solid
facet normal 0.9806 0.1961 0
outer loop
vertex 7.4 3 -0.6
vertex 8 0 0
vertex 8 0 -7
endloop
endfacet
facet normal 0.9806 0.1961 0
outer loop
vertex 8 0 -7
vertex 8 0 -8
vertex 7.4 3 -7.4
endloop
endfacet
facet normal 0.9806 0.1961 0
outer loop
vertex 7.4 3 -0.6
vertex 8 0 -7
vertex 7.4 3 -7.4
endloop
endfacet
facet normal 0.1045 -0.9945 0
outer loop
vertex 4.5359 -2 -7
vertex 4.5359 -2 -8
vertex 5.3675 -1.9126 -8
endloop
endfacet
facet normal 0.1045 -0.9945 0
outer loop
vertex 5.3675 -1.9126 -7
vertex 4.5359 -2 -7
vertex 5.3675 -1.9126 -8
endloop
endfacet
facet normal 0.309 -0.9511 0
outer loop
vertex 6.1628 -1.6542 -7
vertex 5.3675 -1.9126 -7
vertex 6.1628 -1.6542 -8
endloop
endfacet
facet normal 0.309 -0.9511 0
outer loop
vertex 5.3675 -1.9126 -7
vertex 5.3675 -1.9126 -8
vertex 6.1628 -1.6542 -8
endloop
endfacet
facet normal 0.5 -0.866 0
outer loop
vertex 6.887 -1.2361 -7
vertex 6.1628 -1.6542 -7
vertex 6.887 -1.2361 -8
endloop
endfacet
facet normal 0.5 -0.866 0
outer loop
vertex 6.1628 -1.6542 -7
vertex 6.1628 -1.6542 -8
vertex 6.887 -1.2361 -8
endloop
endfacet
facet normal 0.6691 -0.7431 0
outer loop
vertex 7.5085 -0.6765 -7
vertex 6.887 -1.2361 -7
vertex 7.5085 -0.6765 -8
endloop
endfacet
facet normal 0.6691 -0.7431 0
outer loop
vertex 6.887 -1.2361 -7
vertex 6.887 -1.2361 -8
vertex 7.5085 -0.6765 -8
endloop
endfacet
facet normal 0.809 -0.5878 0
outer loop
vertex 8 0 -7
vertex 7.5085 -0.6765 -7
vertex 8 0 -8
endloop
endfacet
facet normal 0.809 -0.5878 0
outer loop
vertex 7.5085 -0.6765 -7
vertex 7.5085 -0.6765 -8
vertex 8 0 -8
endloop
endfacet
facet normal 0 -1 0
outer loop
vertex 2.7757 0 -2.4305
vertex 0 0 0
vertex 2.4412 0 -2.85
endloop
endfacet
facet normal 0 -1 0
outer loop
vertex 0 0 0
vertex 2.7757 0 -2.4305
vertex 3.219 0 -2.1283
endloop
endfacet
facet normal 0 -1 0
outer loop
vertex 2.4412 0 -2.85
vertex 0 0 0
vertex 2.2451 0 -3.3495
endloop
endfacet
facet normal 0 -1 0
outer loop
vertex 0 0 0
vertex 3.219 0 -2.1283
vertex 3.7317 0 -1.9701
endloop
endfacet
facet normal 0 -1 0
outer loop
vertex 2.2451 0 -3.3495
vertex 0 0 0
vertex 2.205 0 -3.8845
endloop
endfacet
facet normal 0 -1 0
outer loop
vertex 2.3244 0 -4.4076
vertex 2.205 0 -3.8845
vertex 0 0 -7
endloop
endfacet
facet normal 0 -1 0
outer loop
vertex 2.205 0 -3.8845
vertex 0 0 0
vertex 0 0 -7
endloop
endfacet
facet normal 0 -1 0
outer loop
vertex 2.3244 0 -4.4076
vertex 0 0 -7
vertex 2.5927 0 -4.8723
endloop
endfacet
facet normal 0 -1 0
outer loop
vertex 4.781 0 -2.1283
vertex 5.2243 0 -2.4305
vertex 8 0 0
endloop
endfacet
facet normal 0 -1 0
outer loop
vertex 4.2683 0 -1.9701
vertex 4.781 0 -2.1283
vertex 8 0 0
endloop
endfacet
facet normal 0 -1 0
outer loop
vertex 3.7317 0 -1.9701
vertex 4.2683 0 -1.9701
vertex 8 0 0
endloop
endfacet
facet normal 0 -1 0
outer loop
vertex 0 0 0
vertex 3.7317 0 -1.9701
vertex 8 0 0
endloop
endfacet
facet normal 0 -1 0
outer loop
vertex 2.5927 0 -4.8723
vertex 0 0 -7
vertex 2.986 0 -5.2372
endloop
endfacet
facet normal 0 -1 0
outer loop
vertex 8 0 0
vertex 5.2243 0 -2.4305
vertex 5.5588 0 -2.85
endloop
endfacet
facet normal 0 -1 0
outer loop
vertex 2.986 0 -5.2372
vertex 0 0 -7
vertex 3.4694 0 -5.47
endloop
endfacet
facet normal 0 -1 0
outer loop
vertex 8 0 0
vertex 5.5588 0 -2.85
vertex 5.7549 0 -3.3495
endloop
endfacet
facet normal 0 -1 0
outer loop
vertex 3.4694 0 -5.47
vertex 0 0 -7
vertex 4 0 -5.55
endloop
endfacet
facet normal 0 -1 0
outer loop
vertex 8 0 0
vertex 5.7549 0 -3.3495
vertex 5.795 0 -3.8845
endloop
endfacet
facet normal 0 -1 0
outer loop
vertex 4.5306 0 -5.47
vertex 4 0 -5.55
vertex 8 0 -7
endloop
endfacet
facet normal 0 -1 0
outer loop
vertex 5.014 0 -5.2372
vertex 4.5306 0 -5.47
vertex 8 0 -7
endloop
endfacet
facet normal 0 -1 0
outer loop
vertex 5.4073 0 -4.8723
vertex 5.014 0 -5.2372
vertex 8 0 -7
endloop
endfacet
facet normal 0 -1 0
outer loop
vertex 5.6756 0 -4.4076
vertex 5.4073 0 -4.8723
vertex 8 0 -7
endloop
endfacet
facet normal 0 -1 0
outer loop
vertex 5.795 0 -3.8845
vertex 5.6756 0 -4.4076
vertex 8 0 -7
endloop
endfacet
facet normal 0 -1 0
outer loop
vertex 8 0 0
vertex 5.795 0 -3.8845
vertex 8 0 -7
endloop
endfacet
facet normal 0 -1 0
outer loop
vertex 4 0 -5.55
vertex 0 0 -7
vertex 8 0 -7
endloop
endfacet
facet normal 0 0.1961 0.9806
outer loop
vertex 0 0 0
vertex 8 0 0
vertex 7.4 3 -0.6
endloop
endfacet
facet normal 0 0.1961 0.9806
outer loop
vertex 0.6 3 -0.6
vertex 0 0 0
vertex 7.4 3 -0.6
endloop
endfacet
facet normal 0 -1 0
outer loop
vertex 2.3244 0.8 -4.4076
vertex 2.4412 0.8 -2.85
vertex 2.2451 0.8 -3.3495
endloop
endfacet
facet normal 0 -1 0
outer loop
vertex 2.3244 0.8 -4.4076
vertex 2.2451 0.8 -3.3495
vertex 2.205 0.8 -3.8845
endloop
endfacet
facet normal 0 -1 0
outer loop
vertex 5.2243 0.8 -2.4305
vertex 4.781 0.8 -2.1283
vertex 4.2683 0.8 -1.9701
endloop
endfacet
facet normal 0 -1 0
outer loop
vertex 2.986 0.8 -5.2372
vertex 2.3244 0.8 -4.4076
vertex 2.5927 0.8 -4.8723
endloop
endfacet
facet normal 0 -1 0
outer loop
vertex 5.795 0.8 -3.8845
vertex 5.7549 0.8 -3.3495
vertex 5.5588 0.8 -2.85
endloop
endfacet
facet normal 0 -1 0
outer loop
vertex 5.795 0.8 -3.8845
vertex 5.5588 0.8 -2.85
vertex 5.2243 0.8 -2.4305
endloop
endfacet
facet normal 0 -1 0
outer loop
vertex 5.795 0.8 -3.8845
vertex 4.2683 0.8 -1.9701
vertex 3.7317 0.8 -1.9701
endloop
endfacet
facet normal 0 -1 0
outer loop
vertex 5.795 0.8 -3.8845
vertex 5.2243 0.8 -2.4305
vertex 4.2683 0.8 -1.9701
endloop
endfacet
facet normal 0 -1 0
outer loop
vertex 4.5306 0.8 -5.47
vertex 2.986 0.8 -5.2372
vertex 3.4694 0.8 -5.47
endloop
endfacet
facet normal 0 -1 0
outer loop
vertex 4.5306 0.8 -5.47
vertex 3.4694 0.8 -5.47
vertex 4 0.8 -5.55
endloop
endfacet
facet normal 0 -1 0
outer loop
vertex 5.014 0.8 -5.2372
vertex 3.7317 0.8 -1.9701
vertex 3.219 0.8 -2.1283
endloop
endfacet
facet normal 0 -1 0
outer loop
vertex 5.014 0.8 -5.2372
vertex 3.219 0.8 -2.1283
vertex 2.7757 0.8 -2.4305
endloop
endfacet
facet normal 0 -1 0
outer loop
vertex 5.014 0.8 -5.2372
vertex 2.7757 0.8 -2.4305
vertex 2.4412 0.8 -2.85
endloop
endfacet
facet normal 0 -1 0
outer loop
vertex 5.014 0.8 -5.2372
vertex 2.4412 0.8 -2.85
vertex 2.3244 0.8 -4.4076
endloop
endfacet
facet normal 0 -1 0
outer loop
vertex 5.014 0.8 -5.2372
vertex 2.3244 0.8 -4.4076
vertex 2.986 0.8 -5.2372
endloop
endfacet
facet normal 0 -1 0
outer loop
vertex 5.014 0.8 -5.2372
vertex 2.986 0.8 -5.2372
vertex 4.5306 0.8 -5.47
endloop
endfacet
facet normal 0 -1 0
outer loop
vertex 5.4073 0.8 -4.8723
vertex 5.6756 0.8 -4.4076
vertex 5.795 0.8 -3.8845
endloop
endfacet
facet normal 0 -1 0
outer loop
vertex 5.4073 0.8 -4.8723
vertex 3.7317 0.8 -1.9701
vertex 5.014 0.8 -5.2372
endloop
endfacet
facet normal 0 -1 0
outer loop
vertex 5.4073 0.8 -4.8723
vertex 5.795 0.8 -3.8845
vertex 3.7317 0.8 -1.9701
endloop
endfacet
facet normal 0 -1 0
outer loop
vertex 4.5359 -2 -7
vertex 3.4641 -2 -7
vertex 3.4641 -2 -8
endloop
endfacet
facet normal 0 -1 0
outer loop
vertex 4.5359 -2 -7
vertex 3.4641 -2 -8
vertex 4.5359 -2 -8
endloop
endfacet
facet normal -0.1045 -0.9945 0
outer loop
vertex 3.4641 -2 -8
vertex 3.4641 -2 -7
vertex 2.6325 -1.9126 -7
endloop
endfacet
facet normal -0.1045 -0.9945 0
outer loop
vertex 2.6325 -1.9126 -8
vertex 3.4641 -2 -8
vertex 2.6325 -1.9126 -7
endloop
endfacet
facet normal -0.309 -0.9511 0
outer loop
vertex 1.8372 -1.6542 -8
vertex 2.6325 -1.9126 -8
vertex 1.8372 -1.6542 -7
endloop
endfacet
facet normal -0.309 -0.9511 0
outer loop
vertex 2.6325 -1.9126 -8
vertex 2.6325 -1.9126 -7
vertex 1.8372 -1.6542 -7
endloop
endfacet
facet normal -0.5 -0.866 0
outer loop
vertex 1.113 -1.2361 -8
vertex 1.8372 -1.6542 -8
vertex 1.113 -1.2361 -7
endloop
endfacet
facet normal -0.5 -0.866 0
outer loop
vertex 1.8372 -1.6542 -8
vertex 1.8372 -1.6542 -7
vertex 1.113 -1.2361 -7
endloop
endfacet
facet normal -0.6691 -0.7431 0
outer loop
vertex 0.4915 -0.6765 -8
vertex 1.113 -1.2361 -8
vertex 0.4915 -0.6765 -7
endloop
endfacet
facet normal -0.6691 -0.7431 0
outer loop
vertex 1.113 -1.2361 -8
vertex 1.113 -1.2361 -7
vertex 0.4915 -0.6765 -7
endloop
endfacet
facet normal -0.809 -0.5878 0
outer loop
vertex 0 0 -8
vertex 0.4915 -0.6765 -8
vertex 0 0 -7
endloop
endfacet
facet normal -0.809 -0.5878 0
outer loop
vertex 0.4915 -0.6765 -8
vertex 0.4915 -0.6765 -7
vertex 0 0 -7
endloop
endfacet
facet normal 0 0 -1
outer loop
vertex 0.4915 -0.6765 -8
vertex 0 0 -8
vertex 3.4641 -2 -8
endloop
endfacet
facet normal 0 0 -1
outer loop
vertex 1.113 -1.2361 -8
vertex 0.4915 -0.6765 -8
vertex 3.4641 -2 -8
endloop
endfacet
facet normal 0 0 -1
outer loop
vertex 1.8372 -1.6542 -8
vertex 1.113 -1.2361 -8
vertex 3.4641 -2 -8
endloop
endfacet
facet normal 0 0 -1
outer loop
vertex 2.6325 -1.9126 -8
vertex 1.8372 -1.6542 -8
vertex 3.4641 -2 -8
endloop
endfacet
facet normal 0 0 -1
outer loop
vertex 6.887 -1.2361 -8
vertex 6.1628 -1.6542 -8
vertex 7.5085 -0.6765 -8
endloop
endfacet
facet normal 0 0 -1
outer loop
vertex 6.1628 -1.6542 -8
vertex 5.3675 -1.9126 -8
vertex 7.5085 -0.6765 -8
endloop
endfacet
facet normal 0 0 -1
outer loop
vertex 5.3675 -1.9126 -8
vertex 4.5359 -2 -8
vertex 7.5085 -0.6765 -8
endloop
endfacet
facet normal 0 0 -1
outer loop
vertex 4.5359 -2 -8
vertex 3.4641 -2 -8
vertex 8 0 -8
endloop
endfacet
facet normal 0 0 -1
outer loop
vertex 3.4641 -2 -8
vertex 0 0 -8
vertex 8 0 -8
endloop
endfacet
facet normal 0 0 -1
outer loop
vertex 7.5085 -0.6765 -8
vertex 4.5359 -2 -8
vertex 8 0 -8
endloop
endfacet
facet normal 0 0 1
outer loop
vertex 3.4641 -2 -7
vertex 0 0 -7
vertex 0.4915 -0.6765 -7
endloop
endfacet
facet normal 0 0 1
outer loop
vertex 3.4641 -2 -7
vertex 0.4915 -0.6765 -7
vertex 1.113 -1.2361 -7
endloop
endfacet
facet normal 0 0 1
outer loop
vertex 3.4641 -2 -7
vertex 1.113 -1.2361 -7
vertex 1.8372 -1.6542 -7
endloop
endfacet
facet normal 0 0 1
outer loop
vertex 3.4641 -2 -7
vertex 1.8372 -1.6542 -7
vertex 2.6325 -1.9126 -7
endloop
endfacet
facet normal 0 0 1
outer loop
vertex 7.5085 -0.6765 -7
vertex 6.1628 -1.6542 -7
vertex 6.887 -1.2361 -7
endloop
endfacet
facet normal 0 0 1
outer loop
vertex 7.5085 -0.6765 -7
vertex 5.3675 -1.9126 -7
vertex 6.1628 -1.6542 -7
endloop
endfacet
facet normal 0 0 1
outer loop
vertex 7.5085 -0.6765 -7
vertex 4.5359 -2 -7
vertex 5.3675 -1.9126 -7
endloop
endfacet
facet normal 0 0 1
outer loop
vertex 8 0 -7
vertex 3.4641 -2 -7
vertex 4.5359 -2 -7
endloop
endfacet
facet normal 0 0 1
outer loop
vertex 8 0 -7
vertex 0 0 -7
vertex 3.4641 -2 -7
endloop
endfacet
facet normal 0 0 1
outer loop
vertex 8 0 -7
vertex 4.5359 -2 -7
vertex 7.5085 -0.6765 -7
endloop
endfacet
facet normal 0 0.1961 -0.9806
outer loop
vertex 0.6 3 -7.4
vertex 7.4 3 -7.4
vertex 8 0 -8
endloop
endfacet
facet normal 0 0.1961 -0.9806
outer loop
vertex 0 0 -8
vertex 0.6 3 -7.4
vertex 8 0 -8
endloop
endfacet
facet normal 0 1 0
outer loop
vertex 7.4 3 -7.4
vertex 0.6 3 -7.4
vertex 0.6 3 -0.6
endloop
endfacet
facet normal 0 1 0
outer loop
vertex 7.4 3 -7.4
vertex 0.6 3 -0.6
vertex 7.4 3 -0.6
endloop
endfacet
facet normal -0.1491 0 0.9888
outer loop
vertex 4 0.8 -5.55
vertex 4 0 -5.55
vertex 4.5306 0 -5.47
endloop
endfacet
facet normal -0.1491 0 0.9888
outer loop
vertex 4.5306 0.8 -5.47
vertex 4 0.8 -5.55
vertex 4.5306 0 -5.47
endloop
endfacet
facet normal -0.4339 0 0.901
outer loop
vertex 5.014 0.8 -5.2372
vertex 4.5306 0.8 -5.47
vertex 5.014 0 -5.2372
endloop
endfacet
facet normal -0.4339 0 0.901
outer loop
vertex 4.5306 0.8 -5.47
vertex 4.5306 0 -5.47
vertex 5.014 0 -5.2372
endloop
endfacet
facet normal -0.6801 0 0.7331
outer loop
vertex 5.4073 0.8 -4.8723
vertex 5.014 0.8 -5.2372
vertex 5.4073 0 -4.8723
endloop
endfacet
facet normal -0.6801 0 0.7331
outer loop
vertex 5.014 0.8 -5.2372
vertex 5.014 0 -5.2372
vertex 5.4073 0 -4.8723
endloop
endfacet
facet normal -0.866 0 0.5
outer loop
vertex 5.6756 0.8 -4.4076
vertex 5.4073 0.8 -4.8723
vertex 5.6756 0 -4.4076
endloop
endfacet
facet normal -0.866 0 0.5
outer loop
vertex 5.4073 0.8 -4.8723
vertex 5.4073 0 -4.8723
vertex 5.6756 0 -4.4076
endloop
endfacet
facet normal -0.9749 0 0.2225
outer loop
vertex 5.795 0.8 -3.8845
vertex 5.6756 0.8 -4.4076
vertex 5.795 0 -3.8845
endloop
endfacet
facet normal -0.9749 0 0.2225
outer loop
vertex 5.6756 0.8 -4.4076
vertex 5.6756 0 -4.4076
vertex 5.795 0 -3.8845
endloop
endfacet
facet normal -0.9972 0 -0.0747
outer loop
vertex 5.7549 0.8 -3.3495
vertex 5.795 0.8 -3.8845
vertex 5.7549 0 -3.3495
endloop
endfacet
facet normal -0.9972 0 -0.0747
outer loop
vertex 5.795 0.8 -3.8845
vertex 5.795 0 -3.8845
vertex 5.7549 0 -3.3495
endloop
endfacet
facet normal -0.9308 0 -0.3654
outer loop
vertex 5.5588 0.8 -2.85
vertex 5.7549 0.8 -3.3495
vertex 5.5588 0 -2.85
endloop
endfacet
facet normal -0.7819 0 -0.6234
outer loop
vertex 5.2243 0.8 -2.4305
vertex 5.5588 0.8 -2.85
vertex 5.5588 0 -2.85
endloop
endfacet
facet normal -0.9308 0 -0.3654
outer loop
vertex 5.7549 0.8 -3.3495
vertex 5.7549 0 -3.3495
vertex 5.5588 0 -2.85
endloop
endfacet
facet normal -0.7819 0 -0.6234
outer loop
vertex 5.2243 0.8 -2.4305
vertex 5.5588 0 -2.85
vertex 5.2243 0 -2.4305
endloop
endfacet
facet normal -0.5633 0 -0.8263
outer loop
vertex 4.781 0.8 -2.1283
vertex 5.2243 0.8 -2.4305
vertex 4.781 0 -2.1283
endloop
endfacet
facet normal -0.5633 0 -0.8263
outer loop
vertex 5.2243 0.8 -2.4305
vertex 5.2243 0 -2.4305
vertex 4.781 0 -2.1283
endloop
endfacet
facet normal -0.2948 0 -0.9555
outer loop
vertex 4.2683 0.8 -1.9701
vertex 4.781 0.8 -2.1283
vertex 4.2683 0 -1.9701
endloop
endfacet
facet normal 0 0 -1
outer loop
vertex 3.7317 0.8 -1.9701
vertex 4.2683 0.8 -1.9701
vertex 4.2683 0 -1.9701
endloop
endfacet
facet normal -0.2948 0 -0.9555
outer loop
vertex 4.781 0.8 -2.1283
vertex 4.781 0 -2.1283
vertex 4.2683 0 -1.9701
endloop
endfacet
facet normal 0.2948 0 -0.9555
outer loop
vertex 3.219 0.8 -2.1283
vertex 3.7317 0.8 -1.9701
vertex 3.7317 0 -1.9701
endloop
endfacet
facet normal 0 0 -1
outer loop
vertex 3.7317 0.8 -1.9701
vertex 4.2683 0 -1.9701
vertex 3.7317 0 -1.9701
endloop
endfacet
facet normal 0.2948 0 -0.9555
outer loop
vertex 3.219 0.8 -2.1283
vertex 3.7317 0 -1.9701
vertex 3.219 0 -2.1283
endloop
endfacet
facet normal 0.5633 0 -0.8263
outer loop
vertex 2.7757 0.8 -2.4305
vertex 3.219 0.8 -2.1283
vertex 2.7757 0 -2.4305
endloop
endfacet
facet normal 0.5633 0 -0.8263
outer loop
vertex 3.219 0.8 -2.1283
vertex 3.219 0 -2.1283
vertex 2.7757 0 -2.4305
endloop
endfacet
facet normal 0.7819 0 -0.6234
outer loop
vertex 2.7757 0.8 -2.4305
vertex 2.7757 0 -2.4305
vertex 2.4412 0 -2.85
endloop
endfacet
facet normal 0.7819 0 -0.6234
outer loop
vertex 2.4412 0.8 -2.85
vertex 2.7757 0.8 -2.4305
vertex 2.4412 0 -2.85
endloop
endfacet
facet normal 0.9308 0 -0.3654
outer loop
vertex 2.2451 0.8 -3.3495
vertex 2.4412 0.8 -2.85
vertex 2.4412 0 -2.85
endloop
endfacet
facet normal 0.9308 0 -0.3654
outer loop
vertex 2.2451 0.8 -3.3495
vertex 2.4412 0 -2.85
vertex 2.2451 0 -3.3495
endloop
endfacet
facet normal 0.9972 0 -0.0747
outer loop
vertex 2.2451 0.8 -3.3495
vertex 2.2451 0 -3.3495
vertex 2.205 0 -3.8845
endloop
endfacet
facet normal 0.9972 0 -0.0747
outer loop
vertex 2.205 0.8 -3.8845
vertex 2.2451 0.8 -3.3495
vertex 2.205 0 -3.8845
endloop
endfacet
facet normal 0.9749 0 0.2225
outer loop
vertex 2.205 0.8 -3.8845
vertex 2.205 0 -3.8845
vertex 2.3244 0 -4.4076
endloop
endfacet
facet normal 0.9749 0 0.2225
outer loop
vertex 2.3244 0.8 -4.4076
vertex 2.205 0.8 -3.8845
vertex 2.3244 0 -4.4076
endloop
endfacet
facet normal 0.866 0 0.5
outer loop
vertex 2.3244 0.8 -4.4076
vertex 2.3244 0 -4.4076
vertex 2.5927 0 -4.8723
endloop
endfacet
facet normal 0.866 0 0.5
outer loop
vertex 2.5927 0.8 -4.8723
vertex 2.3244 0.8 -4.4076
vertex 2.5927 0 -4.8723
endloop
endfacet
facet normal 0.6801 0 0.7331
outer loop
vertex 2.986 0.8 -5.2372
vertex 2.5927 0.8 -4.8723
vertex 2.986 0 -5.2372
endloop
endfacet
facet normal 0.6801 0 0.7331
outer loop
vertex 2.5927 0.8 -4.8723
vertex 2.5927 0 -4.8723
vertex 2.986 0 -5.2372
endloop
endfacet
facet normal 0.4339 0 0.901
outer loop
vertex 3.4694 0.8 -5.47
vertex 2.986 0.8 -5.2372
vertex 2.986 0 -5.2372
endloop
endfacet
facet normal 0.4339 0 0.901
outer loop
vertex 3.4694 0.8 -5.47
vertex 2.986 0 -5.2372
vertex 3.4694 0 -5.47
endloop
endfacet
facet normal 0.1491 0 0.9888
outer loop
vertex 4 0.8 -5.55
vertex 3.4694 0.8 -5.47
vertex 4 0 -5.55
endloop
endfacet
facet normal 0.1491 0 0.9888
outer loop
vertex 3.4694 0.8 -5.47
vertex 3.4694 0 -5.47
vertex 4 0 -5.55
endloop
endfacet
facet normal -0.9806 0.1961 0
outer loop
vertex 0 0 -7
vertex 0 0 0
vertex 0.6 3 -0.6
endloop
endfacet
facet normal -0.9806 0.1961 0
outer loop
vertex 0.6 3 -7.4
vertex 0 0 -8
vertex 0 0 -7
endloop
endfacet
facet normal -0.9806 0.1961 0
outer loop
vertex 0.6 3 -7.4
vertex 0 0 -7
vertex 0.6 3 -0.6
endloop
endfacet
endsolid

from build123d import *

# Parameters (mm, degrees)
SKETCH1_W               = 8
SKETCH1_H               = 8
BOSS_EXTRUDE1_DEPTH     = 3
CUT_EXTRUDE1_DEPTH      = 12.704699911
CUT_EXTRUDE1_DEPTH_BACK = 12.704699911
CUT_EXTRUDE2_DEPTH      = 11
SKETCH4_R               = 1.8
CUT_EXTRUDE3_DEPTH      = 0.8
SKETCH5_W               = 8
SKETCH5_H               = 1
BOSS_EXTRUDE2_DEPTH     = 2
FILLET1_R               = 4


with BuildPart() as part:
    # Sketch1 → Boss-Extrude1 (new body)
    with BuildSketch(Plane(origin=(0, 0, 0), x_dir=(1, 0, 0), z_dir=(0, 1, 0))):
        with Locations((4, 4)):
            Rectangle(SKETCH1_W, SKETCH1_H)
    extrude(amount=BOSS_EXTRUDE1_DEPTH)

    # Sketch2 → Cut-Extrude1 (cut, two sides: drawn at the far end of the back side and taken through both)
    with BuildSketch(Plane.XY.offset(-CUT_EXTRUDE1_DEPTH_BACK)):
        Polygon((0, 0), (0.6, 3), (0, 3), align=None)
        Polygon((8, 0), (7.4, 3), (8, 3), align=None)
    extrude(amount=CUT_EXTRUDE1_DEPTH + CUT_EXTRUDE1_DEPTH_BACK, mode=Mode.SUBTRACT)

    # Sketch3 → Cut-Extrude2 (cut)
    with BuildSketch(Plane(origin=(0, 0, 0), x_dir=(0, 0, -1), z_dir=(1, 0, 0))):
        Polygon((0, 0), (0.6, 3), (0, 3), align=None)
        Polygon((8, 3), (7.4, 3), (8, 0), align=None)
    extrude(amount=CUT_EXTRUDE2_DEPTH, mode=Mode.SUBTRACT)

    # Sketch4 → Cut-Extrude3 (cut)
    with BuildSketch(Plane.XZ):
        with Locations(Location((4, -3.75, 0), (0, 0, 270))):
            Circle(SKETCH4_R)
    extrude(amount=-CUT_EXTRUDE3_DEPTH, mode=Mode.SUBTRACT)

    # Sketch5 → Boss-Extrude2 (add)
    with BuildSketch(Plane.XZ):
        with Locations((4, -7.5)):
            Rectangle(SKETCH5_W, SKETCH5_H)
    extrude(amount=BOSS_EXTRUDE2_DEPTH)

    # Fillet1
    # the kernel refuses this fillet: 4 mm, written as the material it takes off along each edge
    with BuildSketch(Plane(origin=(8, -2, -16.660254038), x_dir=(0, 1, 0), z_dir=(0, 0, 1)), Plane(origin=(0, -2, 1.660254038), x_dir=(0, 1, 0), z_dir=(0, 0, -1))) as fillet1_piece_1:
        with BuildLine():
            CenterArc((4, 3.464101615), FILLET1_R, 180, 60)
            Line((0, 3.464101615), (-0.08, 3.464101615))
            Line((-0.08, 3.464101615), (-0.08, 0))
            Line((-0.08, 0), (0, -0.08))
            ThreePointArc((0, -0.08), (1, -0.08), (1.96, -0.069282032))
            Line((1.96, -0.069282032), (2, 0))
        make_face()
    extrude(amount=18.320508076, mode=Mode.SUBTRACT)


solid = part.part
